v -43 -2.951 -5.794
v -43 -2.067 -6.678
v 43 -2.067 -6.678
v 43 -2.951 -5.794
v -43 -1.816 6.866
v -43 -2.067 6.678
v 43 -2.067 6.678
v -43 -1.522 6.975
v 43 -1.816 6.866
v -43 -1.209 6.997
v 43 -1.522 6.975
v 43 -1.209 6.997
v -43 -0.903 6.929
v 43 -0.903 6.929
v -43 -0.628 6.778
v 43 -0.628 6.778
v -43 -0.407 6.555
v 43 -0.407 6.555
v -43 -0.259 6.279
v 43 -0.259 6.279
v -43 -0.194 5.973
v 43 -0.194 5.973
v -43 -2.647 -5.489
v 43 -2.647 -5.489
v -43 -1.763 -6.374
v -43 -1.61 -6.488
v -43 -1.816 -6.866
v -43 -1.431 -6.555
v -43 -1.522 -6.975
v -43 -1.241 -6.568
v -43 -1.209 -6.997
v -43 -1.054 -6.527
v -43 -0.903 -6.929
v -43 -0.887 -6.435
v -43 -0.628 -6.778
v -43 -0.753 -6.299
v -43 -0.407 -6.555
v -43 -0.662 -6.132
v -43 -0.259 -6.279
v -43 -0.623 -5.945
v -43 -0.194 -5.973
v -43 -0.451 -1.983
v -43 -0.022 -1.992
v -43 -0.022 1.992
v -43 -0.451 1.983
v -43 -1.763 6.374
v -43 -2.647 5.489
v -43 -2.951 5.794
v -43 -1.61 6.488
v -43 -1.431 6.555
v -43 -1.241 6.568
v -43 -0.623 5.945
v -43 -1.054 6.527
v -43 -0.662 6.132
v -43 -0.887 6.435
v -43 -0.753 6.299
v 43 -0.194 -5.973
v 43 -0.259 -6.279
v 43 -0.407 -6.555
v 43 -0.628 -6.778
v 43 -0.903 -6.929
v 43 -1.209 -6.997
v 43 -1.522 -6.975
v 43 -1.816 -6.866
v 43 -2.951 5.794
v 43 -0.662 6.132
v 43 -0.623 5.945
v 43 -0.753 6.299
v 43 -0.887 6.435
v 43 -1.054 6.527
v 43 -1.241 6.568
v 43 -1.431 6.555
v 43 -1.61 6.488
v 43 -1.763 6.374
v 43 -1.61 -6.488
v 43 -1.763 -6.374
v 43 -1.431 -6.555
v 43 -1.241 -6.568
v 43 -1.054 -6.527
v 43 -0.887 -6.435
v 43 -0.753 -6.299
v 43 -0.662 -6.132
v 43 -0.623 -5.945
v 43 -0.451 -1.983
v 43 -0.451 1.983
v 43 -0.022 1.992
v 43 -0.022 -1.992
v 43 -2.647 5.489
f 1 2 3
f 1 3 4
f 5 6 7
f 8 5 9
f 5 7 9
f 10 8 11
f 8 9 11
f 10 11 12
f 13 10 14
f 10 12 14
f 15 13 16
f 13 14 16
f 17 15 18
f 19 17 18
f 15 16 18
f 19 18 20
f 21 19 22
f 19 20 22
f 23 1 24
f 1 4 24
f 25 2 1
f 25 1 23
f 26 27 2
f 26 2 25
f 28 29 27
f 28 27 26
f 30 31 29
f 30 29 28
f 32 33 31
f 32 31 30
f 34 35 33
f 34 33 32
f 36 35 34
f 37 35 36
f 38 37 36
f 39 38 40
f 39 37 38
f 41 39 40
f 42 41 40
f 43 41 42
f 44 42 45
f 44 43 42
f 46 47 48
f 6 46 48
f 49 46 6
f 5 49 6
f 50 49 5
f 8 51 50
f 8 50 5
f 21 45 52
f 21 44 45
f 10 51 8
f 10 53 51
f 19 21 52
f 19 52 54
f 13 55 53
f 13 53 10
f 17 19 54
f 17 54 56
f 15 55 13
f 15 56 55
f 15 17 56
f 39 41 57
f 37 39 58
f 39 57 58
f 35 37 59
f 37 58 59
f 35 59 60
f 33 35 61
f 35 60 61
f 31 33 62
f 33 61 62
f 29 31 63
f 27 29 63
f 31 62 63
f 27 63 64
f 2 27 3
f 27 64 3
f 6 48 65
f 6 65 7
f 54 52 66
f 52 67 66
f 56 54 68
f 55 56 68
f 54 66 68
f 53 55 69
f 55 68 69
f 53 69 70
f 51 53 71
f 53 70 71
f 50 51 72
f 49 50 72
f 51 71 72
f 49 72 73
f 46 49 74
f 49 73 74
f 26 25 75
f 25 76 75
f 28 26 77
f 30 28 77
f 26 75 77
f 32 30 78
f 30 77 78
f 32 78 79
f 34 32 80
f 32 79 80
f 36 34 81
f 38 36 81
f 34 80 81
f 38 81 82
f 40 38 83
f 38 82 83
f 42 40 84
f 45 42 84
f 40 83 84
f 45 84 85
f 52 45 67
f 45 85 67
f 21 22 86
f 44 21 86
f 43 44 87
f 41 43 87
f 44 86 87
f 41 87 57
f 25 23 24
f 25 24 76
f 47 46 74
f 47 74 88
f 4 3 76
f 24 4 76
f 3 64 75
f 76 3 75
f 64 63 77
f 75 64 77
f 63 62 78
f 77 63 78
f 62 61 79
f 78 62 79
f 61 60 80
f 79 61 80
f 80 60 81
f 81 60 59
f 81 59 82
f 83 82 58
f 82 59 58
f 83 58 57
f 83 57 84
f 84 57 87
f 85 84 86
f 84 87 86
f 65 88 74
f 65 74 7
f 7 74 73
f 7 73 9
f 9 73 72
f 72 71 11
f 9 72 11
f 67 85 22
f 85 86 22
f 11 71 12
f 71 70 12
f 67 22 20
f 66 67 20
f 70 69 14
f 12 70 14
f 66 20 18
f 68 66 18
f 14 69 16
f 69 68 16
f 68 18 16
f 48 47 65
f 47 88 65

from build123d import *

# Parameters (mm, degrees)
BOSS_EXTRUDE1_DEPTH = 43


with BuildPart() as part:
    # Sketch1 → Boss-Extrude1 (new body, symmetric)
    with BuildSketch(Plane(origin=(0, 0, 0), x_dir=(0, 0, -1), z_dir=(1, 0, 0))):
        with BuildLine():
            Line((6.678248915, -2.066776115), (5.793546079, -2.951478951))
            Line((5.793546079, -2.951478951), (5.489490163, -2.647423035))
            Line((5.489490163, -2.647423035), (6.374192999, -1.762720199))
            ThreePointArc((6.374192999, -1.762720199), (6.527082765, -1.0543294), (5.944808192, -0.622879372))
            ThreePointArc((5.944808192, -0.622879372), (0, -0.43), (-5.944808192, -0.622879372))
            ThreePointArc((-5.944808192, -0.622879372), (-6.527082765, -1.0543294), (-6.374192999, -1.762720199))
            Line((-6.374192999, -1.762720199), (-5.489490163, -2.647423035))
            Line((-5.489490163, -2.647423035), (-5.793546079, -2.951478951))
            Line((-5.793546079, -2.951478951), (-6.678248915, -2.066776115))
            ThreePointArc((-6.678248915, -2.066776115), (-6.929478176, -0.902744659), (-5.97268156, -0.193783724))
            ThreePointArc((-5.97268156, -0.193783724), (0, 0), (5.97268156, -0.193783724))
            ThreePointArc((5.97268156, -0.193783724), (6.929478176, -0.902744659), (6.678248915, -2.066776115))
        make_face()
    extrude(amount=BOSS_EXTRUDE1_DEPTH, both=True)


solid = part.part
